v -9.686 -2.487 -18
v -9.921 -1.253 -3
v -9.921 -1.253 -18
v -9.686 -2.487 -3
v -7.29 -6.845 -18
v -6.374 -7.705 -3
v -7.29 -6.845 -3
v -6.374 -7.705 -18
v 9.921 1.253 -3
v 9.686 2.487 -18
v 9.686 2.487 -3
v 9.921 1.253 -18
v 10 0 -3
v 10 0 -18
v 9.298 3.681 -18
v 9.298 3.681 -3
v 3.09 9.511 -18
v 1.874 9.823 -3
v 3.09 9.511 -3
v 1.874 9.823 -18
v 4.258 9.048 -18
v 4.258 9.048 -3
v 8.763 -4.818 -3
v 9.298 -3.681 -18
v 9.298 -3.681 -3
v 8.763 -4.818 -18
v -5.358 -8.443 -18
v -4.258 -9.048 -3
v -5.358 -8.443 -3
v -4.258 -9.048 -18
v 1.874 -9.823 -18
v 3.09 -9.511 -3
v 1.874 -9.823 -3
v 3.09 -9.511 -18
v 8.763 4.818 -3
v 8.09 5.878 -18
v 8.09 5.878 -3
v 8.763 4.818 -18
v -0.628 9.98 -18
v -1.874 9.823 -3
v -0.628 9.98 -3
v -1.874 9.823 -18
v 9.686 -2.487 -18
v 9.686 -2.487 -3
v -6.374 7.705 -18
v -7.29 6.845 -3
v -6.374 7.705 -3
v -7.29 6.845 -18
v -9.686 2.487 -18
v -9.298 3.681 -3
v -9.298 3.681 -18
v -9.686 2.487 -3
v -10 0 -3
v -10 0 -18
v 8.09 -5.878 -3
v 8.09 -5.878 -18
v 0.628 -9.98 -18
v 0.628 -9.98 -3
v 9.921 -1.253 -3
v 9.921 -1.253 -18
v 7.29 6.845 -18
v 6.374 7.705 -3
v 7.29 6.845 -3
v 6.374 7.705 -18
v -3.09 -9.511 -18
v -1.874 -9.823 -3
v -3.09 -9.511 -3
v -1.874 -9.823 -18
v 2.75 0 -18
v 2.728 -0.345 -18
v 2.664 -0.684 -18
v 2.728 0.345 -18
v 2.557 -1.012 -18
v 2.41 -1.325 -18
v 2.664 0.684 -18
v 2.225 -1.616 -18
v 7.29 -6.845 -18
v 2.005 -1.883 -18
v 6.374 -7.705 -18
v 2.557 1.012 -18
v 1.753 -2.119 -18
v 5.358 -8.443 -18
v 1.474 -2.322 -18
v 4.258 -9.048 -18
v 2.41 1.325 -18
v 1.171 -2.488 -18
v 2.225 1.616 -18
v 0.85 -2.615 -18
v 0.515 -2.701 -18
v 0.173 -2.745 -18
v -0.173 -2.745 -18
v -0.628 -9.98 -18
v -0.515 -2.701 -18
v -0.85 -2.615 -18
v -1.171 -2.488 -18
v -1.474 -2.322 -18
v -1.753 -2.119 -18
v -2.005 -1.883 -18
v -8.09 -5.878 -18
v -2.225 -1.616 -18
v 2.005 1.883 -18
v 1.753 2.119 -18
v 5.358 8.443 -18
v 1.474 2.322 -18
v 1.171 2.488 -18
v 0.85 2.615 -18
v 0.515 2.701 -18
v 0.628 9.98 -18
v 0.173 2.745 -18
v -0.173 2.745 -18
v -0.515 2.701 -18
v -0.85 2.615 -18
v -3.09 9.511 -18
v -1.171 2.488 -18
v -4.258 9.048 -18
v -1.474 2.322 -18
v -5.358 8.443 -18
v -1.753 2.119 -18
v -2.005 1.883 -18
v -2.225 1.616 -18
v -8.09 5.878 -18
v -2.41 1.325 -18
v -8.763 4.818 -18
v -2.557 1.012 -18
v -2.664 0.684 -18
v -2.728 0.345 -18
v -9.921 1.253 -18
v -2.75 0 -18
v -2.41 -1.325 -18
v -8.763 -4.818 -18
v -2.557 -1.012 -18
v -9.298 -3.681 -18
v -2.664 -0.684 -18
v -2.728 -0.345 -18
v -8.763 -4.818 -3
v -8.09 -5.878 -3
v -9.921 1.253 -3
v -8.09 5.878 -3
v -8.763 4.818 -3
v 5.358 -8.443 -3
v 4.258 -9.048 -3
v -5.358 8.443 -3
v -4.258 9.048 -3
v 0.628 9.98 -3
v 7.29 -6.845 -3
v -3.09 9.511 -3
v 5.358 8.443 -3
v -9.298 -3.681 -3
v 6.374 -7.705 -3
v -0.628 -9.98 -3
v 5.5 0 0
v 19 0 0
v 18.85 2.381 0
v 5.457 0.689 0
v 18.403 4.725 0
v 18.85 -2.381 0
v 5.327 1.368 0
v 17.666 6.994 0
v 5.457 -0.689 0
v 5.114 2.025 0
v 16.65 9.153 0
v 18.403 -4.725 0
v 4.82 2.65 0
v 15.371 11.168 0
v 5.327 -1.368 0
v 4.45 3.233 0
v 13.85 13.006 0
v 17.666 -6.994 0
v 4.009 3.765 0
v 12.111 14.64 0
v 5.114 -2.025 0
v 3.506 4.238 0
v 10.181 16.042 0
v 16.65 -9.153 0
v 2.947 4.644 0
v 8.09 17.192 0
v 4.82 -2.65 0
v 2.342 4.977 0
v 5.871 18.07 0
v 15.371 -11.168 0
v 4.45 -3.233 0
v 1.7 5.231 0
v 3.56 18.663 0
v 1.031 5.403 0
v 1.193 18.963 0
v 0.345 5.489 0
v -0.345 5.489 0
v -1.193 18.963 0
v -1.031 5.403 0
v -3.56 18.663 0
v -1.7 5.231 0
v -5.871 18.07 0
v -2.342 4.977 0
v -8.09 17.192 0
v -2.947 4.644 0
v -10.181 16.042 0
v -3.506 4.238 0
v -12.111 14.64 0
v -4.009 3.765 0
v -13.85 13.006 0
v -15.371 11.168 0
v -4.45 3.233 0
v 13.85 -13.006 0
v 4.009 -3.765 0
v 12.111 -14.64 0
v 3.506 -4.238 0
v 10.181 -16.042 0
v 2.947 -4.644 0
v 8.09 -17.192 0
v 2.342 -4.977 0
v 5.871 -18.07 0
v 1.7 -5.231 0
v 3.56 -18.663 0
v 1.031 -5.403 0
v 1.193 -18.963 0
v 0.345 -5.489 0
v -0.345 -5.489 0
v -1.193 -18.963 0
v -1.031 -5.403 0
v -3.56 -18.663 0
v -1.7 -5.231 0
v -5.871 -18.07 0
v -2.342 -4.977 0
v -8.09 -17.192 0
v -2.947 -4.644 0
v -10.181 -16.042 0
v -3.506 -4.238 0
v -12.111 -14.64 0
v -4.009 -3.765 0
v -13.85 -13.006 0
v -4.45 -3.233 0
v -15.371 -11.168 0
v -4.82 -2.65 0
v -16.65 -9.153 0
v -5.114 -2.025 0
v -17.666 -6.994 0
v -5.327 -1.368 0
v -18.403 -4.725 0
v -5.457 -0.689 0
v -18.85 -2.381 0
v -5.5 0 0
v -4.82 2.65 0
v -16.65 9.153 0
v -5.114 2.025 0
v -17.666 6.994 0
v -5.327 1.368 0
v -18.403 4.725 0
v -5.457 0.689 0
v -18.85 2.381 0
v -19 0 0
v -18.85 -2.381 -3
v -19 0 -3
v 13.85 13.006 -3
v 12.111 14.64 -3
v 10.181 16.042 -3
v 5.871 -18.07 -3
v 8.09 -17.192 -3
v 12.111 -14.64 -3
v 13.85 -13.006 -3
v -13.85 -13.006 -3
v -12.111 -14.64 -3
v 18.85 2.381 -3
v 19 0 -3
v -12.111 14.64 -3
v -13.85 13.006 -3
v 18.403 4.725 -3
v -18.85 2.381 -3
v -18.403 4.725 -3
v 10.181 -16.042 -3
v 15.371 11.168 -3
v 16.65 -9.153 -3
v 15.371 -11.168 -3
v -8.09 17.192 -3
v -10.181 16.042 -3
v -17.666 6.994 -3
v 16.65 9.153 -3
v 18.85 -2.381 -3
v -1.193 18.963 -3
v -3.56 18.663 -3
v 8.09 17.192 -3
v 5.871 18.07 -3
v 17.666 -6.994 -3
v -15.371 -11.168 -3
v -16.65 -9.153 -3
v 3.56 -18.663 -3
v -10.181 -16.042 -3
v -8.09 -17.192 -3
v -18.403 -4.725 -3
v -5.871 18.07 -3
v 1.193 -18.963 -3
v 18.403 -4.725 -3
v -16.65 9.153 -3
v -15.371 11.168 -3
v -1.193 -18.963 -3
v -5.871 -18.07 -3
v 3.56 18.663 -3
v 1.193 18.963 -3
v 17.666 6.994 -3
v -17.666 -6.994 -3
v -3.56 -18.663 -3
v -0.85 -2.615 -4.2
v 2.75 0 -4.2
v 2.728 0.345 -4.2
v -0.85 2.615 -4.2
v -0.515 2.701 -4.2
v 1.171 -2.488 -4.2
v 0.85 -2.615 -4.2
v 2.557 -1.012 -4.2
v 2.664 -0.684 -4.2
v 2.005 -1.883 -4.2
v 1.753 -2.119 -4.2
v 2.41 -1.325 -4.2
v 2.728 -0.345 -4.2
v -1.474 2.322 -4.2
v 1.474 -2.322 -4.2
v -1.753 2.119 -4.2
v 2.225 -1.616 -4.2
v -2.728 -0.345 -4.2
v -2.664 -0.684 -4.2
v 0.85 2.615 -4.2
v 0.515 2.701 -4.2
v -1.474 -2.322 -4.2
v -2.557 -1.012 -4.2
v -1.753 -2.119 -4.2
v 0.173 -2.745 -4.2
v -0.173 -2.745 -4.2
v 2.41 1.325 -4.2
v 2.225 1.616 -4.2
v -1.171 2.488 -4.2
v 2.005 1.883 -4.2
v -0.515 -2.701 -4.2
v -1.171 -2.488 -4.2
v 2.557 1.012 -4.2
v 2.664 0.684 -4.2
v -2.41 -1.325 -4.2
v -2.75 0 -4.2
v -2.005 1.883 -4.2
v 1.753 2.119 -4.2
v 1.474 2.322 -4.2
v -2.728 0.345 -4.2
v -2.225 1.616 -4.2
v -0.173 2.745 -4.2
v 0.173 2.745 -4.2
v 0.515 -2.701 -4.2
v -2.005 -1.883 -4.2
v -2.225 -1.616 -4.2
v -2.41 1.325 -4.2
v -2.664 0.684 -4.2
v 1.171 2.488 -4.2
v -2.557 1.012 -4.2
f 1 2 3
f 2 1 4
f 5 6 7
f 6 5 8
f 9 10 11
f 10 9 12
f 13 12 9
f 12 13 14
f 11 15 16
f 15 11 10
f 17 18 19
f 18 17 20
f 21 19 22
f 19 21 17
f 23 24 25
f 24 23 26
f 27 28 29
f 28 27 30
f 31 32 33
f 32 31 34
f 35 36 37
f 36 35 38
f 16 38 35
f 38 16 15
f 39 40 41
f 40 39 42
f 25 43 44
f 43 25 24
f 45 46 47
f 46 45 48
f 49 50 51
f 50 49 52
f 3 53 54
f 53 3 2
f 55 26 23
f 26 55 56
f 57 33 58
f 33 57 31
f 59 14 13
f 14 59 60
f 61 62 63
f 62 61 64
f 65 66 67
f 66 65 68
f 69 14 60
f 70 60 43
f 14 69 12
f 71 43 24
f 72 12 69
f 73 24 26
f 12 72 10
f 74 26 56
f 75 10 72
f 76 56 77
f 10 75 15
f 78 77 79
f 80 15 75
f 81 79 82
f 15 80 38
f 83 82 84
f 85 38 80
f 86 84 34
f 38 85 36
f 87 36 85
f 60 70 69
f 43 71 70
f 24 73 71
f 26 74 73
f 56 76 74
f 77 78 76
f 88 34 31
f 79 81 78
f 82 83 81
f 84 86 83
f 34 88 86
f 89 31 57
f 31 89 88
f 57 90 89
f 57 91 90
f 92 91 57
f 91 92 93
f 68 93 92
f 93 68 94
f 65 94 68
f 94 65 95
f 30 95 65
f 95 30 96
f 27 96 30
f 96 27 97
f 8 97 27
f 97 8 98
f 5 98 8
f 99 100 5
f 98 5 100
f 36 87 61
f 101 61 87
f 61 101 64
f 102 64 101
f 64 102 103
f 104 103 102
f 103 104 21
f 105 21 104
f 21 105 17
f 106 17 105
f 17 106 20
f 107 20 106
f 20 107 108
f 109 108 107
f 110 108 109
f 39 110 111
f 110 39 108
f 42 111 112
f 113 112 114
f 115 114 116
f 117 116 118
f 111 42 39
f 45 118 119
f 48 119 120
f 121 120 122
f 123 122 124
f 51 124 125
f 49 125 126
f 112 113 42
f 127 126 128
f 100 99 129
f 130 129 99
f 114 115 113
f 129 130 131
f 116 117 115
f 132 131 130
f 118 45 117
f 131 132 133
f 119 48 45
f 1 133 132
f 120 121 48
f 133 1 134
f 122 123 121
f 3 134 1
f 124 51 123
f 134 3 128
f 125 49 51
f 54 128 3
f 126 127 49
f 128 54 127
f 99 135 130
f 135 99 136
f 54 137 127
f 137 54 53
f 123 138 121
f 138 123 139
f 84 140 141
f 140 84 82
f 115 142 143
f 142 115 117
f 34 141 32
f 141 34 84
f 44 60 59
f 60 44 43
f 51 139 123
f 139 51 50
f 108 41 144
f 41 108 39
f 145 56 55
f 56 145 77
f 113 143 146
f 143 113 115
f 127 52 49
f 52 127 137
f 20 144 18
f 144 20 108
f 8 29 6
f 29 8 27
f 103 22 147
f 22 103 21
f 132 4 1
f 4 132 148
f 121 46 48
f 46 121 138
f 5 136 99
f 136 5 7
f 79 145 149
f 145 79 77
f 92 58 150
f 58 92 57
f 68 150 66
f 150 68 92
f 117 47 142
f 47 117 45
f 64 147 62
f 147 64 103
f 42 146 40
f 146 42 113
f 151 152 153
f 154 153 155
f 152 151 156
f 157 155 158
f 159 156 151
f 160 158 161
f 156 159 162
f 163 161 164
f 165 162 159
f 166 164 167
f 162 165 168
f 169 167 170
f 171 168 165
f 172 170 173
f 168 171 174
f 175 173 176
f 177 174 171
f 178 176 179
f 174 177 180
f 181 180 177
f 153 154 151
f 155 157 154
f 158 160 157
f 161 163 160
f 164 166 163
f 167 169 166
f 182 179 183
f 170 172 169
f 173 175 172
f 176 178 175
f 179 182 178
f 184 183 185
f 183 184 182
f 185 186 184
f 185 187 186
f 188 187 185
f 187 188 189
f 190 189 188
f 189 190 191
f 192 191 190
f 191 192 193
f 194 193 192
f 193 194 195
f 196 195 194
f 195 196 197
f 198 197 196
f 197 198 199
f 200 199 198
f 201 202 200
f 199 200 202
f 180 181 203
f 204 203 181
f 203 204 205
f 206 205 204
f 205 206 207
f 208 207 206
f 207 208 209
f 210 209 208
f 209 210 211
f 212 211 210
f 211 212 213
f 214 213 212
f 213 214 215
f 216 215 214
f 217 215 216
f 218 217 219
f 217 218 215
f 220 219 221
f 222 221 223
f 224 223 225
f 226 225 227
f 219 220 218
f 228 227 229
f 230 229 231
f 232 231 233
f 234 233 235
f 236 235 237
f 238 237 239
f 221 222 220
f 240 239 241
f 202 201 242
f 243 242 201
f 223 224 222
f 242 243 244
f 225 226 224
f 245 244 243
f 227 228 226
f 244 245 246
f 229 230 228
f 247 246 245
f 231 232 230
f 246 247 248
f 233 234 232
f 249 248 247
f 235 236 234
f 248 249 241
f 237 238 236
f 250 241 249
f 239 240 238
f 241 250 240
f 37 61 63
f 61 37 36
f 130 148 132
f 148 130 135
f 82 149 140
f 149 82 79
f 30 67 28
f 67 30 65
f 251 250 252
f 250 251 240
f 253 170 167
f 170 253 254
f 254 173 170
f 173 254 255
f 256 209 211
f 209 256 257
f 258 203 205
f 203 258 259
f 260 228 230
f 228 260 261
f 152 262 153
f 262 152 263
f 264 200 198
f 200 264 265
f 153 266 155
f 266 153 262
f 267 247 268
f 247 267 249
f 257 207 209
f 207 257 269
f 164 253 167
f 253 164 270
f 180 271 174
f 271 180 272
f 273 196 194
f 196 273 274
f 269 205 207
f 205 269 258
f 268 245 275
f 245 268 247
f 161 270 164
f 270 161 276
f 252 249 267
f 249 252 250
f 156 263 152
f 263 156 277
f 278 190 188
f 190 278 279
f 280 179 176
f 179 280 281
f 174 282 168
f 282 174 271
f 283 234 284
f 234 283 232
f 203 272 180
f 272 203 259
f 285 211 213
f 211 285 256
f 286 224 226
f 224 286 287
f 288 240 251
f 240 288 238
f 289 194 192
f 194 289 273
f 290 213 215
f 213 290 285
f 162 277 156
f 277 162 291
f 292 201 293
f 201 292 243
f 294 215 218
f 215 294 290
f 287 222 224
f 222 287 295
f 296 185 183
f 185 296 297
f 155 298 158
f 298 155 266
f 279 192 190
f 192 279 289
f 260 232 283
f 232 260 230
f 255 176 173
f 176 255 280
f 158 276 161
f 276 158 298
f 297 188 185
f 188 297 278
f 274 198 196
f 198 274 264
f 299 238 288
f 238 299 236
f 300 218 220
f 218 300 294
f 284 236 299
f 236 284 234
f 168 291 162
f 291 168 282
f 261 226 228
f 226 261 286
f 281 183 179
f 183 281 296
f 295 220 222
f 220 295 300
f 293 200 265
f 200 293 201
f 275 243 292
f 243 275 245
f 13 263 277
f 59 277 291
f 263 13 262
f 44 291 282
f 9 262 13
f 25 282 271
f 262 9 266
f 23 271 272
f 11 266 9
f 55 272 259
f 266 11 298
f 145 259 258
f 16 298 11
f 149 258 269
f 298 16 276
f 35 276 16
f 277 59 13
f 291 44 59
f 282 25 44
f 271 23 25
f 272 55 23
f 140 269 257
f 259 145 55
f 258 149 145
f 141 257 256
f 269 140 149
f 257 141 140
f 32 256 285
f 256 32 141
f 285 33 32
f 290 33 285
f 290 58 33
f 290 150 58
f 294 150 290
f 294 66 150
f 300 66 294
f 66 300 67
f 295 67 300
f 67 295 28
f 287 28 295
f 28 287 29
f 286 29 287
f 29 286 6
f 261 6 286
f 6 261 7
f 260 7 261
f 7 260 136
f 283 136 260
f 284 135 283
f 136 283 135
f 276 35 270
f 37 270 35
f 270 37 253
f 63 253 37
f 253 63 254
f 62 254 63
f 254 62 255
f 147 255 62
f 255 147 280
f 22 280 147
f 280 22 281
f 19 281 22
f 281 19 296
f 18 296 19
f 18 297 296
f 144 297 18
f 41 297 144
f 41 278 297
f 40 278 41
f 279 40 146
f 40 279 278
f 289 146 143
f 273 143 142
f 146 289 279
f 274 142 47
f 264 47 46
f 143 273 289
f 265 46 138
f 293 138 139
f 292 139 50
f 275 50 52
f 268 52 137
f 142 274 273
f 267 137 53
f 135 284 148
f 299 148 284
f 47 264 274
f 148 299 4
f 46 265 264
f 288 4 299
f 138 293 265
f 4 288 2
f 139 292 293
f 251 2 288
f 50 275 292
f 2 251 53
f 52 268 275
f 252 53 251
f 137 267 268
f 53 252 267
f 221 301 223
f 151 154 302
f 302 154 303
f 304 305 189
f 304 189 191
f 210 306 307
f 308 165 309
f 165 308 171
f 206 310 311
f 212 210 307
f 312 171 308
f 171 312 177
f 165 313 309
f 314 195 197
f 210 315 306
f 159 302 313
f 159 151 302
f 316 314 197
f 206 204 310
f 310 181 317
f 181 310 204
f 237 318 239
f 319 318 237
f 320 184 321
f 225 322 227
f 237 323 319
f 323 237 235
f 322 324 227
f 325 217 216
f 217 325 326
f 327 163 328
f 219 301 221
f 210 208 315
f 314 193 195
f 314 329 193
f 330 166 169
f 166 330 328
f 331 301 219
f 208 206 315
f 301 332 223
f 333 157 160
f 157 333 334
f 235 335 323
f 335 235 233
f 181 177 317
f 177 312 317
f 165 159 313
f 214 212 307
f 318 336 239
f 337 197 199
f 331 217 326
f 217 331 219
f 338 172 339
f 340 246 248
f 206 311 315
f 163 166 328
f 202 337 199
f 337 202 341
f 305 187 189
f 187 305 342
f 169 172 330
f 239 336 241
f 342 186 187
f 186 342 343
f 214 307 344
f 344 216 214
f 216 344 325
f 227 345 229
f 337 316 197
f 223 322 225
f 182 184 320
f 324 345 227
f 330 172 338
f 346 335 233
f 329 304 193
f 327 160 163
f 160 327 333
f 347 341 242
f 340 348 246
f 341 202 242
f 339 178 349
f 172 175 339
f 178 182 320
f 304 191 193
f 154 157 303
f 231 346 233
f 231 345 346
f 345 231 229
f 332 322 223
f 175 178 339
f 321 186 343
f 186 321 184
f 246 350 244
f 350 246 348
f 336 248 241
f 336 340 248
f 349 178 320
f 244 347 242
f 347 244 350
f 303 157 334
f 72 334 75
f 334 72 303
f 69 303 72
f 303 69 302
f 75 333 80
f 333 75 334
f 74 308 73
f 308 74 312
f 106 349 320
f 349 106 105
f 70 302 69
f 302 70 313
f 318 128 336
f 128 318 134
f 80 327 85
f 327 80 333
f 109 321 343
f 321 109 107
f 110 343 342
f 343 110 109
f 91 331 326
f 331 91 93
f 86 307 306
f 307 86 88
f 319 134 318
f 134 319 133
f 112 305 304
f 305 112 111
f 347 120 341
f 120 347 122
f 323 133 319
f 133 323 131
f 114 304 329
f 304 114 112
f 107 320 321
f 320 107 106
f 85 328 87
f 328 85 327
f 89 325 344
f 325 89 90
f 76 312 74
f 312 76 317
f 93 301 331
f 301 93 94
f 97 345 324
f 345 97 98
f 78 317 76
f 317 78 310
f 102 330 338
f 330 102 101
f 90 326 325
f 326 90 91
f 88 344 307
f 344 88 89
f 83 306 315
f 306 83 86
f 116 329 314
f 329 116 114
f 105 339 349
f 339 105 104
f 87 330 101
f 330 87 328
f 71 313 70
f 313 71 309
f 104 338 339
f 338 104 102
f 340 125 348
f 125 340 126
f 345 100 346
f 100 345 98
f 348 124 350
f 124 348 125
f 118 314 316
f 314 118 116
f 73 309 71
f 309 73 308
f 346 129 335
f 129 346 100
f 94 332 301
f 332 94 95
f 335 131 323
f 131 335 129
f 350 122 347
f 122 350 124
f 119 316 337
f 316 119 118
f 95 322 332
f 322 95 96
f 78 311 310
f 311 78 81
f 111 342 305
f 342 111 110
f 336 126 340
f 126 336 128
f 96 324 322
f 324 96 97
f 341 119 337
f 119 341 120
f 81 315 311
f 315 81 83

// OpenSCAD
$fn = 50;


difference() {
	union() {
		translate(v = [0, 0, -18.0000000000]) {
			cylinder(h = 18, r = 10.0000000000);
		}
		translate(v = [0, 0, -3.0000000000]) {
			cylinder(h = 3, r = 19.0000000000);
		}
	}
	union() {
		translate(v = [0, 0, 0]) {
			rotate(a = [0, 0, 0]) {
				difference() {
					union() {
						#translate(v = [0, 0, -18.0000000000]) {
							cylinder(h = 18, r = 2.2500000000);
						}
						#translate(v = [0, 0, -4.2000000000]) {
							cylinder(h = 4.2000000000, r1 = 2.7500000000, r2 = 5.5000000000);
						}
						#translate(v = [0, 0, -18.0000000000]) {
							cylinder(h = 18, r = 2.7500000000);
						}
						#translate(v = [0, 0, -18.0000000000]) {
							cylinder(h = 18, r = 2.2500000000);
						}
					}
					union();
				}
			}
		}
	}
}
